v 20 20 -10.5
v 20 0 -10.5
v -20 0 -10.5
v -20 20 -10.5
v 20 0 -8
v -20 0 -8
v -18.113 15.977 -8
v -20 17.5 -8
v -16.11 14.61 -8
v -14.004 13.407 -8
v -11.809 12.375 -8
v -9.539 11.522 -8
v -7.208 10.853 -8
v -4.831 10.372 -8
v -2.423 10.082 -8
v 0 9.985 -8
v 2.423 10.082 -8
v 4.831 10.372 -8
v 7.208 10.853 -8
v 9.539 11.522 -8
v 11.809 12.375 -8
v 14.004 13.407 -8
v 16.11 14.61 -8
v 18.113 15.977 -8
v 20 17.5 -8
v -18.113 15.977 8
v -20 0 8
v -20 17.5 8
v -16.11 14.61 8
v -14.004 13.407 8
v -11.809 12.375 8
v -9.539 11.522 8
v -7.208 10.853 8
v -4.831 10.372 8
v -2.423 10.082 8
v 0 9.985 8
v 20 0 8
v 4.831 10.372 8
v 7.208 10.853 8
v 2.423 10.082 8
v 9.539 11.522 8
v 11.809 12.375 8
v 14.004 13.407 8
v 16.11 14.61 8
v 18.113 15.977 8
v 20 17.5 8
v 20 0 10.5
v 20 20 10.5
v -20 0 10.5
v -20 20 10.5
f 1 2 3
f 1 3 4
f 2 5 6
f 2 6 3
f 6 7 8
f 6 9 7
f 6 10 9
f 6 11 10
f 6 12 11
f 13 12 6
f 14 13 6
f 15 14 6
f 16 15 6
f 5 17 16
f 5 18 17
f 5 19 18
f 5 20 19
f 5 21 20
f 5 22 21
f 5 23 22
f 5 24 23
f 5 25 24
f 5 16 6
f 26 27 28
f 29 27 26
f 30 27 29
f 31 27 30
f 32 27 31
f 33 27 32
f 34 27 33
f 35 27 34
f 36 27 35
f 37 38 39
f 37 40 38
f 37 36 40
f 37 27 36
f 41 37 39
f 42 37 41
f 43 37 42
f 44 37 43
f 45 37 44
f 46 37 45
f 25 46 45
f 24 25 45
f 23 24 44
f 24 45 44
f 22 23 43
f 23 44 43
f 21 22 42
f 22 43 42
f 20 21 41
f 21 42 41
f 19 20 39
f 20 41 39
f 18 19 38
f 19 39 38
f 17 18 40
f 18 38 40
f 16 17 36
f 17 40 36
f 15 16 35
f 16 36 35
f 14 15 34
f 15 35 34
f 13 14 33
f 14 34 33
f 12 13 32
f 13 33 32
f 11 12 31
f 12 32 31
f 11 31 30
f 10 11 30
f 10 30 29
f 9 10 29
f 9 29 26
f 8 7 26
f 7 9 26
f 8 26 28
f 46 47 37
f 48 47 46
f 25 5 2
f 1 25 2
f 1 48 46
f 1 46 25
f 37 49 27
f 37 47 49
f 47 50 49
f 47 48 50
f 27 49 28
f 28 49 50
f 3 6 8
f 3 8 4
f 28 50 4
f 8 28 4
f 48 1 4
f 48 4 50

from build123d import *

# Parameters (mm, degrees)
BOSS_EXTRUDE1_DEPTH = 20
BOSS_EXTRUDE2_REACH = 35.797


with BuildPart() as part:
    # Sketch1 → Boss-Extrude1 (new, symmetric)
    with BuildSketch(Plane(origin=(0, 0, 0), x_dir=(0, 0, -1), z_dir=(1, 0, 0))):
        Polygon((-8, 0), (-8, 17.5), (8, 17.5), (8, 0), (10.5, 0), (10.5, 20), (-10.5, 20), (-10.5, 0), align=None)
    extrude(amount=BOSS_EXTRUDE1_DEPTH, both=True)

    # Sketch2 → Boss-Extrude2 (add, up to next)
    with BuildSketch(Plane(origin=(0, 0, 8), x_dir=(-1, 0, 0), z_dir=(0, 0, -1)), mode=Mode.PRIVATE) as boss_extrude2_sk1:
        with BuildLine():
            Line((20, 17.5), (20, 20))
            Line((20, 20), (-20, 20))
            Line((-20, 20), (-20, 17.5))
            ThreePointArc((-20, 17.5), (0, 9.985297678), (20, 17.5))
        make_face()
    boss_extrude2_tool1 = extrude(boss_extrude2_sk1.sketch, amount=BOSS_EXTRUDE2_REACH, mode=Mode.PRIVATE) - part.part
    add(boss_extrude2_tool1.solids().sort_by_distance((0, 15.86208, 8))[0])


solid = part.part
